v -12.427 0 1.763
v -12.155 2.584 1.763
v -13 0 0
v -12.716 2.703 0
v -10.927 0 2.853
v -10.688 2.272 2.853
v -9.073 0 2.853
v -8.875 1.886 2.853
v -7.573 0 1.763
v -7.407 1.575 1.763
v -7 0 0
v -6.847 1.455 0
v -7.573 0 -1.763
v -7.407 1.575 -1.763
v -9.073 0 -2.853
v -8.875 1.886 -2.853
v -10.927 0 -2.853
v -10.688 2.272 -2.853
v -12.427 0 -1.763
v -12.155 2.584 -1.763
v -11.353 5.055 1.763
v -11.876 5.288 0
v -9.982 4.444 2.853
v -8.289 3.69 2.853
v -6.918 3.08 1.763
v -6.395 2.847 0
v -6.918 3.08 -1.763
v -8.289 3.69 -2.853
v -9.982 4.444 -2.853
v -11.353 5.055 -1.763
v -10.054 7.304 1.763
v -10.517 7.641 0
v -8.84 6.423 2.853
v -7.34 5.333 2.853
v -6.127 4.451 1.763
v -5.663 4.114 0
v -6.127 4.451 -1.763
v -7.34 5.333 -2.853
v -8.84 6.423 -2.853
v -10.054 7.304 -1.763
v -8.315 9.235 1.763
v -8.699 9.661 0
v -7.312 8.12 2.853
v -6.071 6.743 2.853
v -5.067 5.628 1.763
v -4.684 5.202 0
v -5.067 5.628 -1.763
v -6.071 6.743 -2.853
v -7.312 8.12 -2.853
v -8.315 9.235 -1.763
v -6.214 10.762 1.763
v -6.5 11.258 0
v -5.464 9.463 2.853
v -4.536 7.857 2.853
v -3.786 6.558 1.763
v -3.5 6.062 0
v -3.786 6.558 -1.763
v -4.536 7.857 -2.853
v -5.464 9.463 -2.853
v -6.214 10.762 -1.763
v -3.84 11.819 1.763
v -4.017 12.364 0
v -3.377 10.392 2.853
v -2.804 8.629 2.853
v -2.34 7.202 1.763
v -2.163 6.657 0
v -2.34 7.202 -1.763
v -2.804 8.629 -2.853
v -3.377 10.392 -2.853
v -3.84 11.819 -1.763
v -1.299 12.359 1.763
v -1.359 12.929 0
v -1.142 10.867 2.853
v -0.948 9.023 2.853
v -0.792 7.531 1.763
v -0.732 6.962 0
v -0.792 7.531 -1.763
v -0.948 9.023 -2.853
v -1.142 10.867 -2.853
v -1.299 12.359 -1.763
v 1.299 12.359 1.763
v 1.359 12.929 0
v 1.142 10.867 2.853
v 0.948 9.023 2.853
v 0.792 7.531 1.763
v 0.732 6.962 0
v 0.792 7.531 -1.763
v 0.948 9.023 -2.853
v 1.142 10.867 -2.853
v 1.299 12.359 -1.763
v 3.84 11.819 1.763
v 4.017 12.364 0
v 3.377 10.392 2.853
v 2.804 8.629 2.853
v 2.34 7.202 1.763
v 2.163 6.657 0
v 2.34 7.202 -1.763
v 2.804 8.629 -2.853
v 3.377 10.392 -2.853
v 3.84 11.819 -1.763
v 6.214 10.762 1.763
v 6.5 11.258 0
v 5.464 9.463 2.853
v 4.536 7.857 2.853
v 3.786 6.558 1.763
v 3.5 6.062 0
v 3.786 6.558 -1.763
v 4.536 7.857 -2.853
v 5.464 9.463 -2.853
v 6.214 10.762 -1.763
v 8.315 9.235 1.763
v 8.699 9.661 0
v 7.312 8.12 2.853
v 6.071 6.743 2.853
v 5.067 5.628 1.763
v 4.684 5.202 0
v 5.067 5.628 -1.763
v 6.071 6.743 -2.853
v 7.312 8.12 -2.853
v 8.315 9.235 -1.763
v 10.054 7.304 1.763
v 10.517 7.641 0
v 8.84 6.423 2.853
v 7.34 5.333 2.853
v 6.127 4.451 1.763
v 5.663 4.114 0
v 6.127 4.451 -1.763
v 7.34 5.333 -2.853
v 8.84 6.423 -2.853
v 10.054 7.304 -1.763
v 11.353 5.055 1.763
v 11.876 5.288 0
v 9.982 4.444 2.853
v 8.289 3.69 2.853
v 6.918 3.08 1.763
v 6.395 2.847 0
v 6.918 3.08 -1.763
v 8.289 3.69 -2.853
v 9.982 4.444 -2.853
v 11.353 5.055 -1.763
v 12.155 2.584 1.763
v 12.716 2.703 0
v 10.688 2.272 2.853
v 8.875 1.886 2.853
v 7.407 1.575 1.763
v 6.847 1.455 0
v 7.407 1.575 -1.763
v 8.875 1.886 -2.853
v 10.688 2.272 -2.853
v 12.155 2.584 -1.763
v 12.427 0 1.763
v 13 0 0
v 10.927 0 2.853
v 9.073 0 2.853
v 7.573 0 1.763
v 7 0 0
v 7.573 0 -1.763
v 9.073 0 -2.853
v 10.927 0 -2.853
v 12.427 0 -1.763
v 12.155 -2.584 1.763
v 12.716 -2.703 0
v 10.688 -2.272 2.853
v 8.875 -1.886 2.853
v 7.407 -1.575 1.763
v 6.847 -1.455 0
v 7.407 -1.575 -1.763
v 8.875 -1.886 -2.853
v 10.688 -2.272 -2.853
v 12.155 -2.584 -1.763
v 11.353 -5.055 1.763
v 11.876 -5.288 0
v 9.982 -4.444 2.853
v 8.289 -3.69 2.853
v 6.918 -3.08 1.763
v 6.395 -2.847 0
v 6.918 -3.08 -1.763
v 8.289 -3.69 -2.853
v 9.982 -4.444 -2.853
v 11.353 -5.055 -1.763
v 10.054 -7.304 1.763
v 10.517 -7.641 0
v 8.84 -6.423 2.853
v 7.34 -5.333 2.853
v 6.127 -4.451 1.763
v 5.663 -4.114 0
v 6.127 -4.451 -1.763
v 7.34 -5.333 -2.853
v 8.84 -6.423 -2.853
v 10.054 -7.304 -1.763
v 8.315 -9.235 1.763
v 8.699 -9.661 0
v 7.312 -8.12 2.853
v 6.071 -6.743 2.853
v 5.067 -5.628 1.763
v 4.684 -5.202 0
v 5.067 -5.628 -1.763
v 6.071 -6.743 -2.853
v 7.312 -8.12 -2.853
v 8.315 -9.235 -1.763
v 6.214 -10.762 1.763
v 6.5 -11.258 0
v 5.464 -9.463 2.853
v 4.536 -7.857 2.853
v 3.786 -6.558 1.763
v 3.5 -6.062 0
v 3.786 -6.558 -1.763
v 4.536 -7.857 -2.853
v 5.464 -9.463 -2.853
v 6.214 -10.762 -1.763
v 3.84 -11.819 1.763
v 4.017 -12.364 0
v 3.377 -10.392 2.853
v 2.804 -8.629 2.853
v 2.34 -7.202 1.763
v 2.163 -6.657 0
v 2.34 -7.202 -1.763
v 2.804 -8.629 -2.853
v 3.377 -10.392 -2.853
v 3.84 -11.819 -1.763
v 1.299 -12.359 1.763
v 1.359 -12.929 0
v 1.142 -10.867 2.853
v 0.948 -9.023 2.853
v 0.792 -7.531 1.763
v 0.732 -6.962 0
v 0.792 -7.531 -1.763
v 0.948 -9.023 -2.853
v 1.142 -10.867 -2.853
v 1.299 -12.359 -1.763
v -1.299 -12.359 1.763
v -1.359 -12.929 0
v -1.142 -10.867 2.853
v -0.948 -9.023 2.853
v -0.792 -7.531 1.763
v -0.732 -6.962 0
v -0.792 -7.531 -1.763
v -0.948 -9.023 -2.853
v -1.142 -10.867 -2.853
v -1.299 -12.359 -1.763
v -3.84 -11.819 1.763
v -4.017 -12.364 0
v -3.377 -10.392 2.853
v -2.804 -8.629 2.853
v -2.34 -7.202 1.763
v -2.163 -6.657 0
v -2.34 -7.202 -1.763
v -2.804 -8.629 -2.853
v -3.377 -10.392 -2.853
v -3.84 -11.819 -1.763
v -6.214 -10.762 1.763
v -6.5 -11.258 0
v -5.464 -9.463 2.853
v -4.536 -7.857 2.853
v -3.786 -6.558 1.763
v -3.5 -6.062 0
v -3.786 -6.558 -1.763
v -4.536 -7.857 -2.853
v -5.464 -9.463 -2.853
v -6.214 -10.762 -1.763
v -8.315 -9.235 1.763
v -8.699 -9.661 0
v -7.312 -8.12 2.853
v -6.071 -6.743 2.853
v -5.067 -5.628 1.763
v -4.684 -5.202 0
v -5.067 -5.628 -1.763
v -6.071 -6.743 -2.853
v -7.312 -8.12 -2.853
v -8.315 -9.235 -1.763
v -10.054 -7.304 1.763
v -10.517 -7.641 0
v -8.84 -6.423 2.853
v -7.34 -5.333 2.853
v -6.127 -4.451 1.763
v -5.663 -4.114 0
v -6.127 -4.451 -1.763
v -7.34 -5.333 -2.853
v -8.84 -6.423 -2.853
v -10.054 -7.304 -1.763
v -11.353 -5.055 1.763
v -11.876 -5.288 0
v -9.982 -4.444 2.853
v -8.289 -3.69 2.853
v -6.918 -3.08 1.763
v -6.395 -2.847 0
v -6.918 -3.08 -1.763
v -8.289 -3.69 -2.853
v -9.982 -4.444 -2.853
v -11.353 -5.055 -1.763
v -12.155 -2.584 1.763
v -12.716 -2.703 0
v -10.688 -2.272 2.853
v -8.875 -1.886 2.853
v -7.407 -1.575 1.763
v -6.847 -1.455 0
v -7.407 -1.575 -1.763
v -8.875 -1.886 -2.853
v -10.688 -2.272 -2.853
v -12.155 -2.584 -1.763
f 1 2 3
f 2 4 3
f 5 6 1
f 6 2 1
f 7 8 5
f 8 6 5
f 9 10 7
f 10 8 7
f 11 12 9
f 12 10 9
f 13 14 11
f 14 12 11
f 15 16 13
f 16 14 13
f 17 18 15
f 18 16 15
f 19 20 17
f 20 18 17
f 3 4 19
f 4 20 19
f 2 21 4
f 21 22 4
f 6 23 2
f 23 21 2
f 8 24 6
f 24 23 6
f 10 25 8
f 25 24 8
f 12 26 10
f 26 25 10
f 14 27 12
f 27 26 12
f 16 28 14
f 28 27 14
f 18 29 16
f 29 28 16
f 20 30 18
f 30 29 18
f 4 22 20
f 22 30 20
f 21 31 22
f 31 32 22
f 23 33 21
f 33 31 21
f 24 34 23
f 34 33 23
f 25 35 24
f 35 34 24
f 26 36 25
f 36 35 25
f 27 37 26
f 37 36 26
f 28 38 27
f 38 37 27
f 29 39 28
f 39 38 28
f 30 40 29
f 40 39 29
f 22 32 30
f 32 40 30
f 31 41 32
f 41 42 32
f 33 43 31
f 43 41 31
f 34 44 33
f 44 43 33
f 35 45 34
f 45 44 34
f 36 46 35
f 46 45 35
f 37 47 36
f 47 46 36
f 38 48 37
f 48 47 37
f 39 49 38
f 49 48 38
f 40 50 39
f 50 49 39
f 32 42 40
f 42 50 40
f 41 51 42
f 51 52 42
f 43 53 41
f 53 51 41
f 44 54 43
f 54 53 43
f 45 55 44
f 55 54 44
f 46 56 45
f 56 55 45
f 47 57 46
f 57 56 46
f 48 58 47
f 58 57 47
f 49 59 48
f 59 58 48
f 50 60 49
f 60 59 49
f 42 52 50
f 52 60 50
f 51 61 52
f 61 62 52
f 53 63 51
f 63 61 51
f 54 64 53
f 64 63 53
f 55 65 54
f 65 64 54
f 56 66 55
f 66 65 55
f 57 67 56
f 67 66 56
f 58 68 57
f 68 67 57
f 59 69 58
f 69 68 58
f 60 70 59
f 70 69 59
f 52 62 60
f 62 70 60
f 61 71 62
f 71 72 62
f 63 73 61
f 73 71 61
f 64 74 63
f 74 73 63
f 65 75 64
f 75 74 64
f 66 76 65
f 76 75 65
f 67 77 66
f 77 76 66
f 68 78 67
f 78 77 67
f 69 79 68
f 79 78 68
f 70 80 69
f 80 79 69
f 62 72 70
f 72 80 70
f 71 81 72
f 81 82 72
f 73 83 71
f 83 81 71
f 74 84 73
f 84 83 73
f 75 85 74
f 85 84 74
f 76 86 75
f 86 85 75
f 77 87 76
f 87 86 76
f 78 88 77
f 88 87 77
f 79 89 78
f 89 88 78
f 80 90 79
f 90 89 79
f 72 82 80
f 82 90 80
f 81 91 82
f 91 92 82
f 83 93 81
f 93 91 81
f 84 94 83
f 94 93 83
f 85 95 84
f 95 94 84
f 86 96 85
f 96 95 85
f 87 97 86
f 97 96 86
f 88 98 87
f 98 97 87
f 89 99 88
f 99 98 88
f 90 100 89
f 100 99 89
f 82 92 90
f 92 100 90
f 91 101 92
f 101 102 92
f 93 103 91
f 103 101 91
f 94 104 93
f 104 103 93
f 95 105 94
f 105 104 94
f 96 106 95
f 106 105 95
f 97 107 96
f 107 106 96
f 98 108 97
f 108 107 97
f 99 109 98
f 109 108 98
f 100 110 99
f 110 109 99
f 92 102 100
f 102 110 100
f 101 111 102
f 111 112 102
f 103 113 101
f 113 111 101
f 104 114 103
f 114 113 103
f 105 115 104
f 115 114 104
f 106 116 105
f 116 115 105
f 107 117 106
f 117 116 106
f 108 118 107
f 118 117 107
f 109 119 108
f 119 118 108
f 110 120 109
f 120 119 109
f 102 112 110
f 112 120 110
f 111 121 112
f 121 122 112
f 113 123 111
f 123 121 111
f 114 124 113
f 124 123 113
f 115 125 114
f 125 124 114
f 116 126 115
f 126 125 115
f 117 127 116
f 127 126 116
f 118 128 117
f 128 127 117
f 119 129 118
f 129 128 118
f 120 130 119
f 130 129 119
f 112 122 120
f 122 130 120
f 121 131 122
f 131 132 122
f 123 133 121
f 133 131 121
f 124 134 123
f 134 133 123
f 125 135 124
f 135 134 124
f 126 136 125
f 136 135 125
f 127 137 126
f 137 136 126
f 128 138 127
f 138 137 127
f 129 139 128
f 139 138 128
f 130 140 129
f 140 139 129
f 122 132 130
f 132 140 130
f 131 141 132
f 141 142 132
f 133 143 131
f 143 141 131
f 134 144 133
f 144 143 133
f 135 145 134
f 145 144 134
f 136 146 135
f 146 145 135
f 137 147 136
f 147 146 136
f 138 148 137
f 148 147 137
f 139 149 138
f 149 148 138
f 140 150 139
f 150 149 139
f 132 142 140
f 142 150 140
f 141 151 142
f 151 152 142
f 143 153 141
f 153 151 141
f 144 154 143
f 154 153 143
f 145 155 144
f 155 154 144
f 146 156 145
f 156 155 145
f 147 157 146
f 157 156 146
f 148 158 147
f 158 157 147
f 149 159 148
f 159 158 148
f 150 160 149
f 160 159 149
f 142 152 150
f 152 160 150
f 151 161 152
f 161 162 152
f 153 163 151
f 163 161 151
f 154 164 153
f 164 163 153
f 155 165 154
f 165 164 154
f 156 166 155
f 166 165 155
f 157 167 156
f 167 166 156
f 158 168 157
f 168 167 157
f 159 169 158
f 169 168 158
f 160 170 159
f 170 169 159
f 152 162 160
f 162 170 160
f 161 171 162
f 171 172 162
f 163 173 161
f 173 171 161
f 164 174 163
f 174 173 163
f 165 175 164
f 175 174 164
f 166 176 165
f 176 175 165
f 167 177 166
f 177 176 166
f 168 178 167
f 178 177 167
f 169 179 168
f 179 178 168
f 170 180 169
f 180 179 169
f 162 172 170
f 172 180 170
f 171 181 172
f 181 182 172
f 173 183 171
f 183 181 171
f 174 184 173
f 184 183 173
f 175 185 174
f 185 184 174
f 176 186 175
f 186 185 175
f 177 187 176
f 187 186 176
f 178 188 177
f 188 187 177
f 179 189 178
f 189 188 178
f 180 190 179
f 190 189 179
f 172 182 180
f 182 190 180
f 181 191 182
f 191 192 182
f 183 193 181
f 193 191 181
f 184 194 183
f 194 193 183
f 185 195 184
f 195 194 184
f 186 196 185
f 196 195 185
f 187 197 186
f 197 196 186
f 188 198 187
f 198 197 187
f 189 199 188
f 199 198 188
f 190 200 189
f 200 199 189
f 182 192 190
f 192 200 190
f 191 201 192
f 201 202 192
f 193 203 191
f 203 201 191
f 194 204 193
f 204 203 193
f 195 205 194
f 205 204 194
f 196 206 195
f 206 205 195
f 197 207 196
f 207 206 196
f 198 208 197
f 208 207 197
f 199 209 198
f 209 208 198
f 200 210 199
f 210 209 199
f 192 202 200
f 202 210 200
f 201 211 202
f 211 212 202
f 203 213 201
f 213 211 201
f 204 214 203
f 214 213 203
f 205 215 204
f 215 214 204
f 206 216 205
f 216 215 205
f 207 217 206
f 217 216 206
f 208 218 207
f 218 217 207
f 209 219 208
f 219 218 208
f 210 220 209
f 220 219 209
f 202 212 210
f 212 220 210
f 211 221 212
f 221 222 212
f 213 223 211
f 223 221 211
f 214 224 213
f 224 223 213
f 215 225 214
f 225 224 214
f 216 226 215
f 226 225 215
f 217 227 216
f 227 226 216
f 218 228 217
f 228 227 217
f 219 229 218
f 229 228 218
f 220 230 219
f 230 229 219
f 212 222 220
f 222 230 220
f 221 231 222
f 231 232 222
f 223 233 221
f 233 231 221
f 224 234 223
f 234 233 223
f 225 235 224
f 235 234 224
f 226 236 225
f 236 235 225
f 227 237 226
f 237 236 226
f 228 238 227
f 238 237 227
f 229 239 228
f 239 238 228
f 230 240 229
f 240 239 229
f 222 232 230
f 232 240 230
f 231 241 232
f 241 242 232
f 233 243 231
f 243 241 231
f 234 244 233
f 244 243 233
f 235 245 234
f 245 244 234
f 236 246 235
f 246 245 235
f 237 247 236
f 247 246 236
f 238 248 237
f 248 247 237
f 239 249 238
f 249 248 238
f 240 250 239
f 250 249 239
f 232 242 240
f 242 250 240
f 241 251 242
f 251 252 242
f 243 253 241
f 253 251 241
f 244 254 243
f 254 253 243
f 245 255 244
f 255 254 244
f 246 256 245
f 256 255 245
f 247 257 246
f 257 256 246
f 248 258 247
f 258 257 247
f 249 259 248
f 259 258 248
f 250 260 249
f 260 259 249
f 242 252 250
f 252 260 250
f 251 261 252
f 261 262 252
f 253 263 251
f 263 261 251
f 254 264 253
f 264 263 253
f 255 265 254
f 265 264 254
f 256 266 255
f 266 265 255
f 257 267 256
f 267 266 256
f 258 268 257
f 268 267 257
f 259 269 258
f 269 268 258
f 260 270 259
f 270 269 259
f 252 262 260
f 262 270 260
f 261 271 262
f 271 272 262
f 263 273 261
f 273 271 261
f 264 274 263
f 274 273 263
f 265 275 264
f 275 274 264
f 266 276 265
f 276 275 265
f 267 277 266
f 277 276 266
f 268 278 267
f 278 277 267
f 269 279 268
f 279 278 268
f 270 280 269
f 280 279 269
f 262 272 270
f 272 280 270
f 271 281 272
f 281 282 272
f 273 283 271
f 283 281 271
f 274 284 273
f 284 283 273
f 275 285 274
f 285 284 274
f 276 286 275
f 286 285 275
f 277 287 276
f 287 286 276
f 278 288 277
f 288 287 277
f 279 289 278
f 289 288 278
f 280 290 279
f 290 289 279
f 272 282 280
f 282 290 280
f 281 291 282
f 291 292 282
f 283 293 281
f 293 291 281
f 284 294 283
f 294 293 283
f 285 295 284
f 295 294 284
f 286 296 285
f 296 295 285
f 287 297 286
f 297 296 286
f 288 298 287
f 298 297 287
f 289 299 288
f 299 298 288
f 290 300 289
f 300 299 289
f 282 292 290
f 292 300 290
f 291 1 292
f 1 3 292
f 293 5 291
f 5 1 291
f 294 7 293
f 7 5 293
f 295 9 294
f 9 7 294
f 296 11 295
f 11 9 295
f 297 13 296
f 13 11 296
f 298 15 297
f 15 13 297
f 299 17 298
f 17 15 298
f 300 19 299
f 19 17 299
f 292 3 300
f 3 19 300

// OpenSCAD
// Stage 2 of docs/audits/exact-geometry-rust.md: extrusions.
// A whole torus: rotate_extrude of an off-axis circle (one face, two seams).
// volume: 1776.5287921960844
rotate_extrude() translate([10, 0]) circle(3);
